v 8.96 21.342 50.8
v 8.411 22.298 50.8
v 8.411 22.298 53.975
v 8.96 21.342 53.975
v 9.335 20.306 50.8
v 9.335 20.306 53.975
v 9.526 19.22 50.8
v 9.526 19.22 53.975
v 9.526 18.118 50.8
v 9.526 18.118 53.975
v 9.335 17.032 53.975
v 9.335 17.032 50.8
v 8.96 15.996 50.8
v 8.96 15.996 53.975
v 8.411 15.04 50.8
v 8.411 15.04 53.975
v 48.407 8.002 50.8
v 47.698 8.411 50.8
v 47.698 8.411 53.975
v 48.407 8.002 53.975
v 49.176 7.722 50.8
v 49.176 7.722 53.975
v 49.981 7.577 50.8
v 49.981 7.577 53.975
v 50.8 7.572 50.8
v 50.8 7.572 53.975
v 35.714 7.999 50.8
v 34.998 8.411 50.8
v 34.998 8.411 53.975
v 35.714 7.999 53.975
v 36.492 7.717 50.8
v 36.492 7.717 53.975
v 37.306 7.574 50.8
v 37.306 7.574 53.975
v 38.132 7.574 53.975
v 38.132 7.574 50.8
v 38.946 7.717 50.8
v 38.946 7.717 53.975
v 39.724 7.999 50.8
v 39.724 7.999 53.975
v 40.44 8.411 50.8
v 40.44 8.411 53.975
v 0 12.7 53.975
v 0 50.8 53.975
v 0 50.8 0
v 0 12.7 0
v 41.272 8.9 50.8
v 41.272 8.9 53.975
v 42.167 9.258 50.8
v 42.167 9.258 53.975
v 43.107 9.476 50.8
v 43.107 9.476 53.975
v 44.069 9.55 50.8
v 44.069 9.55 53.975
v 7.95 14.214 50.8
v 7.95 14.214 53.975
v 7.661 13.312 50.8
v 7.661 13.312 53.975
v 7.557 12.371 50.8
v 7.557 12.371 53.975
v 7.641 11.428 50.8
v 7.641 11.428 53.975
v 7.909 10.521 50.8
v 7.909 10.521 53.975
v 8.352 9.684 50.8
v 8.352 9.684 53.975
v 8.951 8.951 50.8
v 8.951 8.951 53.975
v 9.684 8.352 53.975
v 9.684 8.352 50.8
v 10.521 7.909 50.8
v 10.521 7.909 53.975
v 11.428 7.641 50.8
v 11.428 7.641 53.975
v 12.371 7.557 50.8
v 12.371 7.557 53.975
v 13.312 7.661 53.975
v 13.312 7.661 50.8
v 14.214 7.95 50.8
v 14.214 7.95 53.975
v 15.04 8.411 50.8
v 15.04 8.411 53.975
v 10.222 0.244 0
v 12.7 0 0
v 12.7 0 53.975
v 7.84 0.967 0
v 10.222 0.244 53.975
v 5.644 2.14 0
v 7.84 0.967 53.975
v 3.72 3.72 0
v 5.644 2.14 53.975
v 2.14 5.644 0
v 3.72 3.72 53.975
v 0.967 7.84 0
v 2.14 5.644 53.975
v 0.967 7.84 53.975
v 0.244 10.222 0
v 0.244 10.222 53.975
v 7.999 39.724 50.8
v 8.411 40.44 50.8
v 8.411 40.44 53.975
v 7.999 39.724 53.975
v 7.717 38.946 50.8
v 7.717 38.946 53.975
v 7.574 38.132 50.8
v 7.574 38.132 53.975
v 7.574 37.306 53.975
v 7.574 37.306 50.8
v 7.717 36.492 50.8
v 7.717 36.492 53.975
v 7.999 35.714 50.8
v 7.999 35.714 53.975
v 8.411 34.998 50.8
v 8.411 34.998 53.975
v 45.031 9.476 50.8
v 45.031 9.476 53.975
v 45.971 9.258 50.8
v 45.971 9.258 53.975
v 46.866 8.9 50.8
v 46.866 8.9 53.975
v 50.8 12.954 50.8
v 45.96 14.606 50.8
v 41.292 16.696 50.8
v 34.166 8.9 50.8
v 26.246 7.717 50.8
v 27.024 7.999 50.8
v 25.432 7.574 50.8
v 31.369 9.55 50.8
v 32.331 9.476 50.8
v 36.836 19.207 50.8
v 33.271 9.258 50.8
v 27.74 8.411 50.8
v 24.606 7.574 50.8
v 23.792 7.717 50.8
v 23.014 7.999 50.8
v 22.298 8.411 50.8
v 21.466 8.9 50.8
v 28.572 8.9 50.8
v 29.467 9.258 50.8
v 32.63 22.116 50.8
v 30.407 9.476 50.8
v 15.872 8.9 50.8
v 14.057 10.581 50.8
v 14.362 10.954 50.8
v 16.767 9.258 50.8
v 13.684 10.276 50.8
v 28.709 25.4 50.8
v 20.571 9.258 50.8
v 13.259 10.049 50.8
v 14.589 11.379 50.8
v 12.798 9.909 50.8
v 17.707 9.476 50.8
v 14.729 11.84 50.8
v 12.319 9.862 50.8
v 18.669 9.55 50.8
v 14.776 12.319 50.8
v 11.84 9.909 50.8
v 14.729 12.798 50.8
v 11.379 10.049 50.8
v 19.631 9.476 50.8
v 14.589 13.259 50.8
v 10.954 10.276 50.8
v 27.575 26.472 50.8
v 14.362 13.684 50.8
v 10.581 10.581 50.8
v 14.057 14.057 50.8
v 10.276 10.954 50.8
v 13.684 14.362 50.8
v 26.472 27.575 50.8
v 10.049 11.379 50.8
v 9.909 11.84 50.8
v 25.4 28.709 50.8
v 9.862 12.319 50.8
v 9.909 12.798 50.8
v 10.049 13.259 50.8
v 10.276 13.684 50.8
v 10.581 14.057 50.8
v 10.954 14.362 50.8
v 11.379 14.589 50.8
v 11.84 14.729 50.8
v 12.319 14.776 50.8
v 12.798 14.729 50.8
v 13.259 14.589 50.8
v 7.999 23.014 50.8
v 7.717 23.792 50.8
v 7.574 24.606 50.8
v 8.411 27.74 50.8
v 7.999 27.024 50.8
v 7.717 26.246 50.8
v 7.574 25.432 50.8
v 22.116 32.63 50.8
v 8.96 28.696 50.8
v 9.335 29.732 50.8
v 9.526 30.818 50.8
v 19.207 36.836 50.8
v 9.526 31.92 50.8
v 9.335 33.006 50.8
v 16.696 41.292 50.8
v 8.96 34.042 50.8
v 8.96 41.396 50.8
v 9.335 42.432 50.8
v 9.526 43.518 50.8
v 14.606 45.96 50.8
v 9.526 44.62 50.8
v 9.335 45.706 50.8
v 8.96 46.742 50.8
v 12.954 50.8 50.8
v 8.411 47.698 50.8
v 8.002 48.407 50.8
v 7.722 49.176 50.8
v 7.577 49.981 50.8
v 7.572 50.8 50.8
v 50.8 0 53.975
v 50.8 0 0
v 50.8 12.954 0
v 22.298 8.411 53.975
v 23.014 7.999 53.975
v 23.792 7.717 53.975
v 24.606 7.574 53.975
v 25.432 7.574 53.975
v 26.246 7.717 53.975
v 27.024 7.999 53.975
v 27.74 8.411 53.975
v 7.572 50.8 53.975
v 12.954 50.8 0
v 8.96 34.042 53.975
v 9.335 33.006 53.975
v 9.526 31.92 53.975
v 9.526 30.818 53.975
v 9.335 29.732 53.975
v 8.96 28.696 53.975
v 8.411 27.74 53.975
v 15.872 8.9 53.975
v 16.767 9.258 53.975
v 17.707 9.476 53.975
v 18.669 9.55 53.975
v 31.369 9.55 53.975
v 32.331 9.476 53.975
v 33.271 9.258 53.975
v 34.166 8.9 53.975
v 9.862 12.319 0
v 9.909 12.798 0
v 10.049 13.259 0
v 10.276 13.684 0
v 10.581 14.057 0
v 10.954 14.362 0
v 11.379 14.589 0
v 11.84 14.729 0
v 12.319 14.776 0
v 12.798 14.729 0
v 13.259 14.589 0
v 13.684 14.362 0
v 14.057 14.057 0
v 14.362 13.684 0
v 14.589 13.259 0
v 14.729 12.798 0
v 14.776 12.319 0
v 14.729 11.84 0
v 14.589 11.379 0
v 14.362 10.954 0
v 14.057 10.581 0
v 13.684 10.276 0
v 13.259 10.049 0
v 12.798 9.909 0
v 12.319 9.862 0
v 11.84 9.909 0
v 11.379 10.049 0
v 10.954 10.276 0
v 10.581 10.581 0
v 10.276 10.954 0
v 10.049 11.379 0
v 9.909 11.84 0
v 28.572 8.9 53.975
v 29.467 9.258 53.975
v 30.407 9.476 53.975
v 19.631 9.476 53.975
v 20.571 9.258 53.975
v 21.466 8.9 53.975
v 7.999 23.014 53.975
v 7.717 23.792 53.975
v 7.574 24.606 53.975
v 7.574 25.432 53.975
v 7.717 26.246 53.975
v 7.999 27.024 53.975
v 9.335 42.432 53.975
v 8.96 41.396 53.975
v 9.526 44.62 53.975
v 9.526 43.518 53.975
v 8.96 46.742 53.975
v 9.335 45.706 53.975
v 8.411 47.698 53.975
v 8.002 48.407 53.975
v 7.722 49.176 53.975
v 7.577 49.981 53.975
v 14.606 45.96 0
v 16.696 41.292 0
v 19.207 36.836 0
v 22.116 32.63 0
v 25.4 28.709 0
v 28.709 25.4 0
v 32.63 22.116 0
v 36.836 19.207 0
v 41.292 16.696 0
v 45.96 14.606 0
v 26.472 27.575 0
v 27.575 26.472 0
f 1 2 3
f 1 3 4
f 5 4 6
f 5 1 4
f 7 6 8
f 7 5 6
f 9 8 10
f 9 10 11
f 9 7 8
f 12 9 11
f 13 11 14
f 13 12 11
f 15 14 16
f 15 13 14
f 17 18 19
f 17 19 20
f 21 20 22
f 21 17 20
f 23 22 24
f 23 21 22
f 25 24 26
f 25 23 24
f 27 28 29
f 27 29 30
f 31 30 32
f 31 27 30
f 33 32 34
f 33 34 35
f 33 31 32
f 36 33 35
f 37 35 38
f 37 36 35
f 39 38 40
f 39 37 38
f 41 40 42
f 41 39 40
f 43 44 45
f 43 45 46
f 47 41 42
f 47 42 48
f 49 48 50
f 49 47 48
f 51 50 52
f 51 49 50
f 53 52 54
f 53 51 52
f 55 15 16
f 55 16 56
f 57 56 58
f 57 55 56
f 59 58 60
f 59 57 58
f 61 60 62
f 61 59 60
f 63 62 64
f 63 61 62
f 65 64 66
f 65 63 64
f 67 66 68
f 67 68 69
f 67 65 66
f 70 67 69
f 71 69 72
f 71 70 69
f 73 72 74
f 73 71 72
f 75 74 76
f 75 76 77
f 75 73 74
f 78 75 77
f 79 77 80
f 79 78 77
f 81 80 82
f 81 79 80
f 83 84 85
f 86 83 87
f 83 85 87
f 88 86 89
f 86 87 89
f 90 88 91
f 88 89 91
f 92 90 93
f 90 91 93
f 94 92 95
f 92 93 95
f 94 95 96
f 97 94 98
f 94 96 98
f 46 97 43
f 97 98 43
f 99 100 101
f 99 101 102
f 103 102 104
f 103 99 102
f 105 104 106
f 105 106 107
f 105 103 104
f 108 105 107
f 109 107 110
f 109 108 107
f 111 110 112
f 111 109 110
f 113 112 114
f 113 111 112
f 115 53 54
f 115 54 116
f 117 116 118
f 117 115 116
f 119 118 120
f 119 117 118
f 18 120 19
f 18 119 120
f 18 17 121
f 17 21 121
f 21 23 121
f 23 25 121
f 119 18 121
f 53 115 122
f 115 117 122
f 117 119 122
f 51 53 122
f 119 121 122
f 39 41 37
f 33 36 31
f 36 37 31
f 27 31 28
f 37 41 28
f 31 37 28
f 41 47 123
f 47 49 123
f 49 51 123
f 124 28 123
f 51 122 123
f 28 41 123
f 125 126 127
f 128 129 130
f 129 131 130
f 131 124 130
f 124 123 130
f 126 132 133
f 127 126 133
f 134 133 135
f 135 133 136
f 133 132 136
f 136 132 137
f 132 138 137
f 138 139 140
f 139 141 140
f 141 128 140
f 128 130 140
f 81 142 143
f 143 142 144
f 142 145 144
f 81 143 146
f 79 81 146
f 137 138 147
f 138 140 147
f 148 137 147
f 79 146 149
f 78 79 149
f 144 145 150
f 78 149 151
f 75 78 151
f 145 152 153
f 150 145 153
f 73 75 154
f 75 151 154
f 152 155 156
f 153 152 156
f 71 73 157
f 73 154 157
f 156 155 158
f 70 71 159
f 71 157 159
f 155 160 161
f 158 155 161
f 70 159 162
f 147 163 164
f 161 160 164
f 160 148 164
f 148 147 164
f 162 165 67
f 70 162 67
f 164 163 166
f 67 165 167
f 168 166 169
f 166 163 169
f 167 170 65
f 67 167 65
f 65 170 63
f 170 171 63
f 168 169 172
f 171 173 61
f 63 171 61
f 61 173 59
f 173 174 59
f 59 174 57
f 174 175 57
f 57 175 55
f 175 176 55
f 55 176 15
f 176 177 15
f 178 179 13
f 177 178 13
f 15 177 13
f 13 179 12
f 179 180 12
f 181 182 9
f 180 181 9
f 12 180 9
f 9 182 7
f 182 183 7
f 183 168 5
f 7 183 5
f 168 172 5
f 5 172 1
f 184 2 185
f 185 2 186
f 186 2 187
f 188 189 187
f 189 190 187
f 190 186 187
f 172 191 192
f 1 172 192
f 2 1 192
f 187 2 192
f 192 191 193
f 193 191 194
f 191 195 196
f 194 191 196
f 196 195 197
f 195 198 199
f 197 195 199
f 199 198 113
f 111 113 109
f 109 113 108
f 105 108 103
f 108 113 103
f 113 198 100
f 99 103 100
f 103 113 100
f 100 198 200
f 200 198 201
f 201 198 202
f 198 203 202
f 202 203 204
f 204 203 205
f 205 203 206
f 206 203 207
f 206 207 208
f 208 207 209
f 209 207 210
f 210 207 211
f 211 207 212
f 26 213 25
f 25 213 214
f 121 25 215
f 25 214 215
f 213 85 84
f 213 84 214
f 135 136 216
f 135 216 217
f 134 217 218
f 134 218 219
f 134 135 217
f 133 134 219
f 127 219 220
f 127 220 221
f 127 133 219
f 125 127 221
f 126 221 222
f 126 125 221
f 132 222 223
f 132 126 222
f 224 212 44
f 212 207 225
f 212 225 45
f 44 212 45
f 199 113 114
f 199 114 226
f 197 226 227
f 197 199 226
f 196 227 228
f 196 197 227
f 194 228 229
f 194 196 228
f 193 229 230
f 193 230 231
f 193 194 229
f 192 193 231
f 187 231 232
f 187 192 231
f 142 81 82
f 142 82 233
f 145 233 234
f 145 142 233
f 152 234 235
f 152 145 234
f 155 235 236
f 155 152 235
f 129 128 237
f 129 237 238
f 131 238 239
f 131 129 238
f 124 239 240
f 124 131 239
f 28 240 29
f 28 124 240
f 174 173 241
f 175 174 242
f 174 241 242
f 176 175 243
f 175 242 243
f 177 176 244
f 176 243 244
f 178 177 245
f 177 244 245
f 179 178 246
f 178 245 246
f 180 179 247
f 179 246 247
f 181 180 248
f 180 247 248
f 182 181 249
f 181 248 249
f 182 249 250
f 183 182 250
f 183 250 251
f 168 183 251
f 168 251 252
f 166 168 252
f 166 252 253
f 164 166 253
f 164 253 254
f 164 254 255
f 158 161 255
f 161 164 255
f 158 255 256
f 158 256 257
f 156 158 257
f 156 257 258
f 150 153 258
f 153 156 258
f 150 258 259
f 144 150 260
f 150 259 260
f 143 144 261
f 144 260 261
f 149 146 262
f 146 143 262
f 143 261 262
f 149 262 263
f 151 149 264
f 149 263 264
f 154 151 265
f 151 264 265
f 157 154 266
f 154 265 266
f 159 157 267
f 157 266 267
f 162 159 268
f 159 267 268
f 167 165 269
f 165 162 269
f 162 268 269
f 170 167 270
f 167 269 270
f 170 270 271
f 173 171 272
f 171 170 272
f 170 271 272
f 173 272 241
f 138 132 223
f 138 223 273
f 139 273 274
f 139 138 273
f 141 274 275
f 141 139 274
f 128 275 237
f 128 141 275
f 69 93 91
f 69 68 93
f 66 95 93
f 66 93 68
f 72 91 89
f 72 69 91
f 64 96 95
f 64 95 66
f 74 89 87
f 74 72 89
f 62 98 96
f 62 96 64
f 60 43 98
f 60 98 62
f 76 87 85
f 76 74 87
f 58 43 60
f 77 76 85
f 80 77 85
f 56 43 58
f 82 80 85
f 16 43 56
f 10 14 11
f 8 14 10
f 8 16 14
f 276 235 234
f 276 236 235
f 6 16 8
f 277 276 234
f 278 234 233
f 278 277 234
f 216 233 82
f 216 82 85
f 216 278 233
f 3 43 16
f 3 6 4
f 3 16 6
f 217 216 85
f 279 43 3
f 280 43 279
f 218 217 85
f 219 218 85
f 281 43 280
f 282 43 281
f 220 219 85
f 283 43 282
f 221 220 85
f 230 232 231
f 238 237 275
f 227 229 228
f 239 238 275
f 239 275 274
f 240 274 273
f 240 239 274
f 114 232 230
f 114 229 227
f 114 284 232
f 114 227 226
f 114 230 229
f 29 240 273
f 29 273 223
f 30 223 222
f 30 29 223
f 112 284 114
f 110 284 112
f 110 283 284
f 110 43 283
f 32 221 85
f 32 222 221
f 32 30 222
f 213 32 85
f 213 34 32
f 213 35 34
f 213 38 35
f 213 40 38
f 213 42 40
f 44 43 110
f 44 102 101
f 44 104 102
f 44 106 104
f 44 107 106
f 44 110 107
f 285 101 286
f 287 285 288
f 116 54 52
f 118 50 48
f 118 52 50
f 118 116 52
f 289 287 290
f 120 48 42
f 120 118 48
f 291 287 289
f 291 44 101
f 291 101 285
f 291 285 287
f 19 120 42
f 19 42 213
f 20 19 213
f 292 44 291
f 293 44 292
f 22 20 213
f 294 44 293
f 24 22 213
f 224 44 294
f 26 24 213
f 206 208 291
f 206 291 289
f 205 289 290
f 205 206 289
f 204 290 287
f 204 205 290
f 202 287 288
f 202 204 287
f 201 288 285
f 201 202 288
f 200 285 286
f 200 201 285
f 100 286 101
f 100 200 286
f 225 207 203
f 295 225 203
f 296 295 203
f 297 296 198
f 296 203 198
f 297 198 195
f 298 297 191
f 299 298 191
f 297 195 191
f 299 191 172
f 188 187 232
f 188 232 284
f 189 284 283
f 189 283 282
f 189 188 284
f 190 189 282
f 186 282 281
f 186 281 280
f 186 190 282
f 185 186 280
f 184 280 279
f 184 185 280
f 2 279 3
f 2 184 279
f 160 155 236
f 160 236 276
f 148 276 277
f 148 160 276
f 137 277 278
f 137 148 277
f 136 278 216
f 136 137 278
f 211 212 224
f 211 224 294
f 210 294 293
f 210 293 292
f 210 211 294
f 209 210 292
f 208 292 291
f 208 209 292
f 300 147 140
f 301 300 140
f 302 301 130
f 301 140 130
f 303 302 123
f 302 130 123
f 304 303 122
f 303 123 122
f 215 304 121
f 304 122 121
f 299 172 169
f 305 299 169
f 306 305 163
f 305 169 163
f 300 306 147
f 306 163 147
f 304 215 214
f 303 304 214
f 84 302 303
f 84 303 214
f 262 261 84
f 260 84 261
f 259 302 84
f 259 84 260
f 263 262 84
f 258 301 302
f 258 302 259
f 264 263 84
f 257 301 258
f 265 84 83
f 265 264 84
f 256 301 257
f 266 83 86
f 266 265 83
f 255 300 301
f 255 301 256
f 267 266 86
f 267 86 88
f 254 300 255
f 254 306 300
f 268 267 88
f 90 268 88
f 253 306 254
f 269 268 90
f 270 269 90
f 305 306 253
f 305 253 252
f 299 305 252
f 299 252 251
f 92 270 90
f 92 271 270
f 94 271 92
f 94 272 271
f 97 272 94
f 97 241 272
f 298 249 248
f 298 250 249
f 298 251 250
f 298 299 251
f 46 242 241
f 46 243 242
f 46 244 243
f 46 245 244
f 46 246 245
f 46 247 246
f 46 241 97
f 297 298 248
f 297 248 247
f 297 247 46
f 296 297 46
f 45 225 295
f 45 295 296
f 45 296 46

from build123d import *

# Parameters (mm, degrees)
BOSS_EXTRUDE1_DEPTH          = 53.975
F_10_0_1935_DIAMETER_HOLE1_D = 4.9149
CUT_EXTRUDE2_DEPTH           = 90.858670283
CUT_EXTRUDE3_START           = -3.175
SKETCH4_4_R                  = 2.45745
CUT_EXTRUDE3_DEPTH           = 3.175
CUT_EXTRUDE5_DEPTH           = 88.988181024
EXTRUDE_THIN1_DEPTH          = 50.8


with BuildPart() as part:
    # Sketch1 → Boss-Extrude1 (new body)
    with BuildSketch(Plane.XY):
        Polygon((0, 0), (50.8, 0), (50.8, 25.4), (25.4, 25.4), (25.4, 50.8), (0, 50.8), align=None)
    extrude(amount=BOSS_EXTRUDE1_DEPTH)

    # #10 (0.1935) Diameter Hole1 (through all)
    with Locations(Plane(origin=(12.319, 12.319, 53.975), x_dir=(1, 0, 0), z_dir=(0, 0, 1))):
        with Locations((0, 0)):
            Hole(F_10_0_1935_DIAMETER_HOLE1_D / 2)

    # Sketch4 → Cut-Extrude2 (cut, through all)
    with BuildSketch(Plane.XY.offset(53.975)):
        with BuildLine():
            ThreePointArc((12.7, 0), (3.719743879, 3.719743879), (0, 12.7))
            Line((0, 12.7), (0, 0))
            Line((0, 0), (12.7, 0))
        make_face()
    extrude(amount=-CUT_EXTRUDE2_DEPTH, mode=Mode.SUBTRACT)

    # Sketch4<4> → Cut-Extrude3 (cut)
    with BuildSketch(Plane.XY.offset(53.975).offset(CUT_EXTRUDE3_START)):
        with BuildLine():
            Line((25.4, 50.8), (7.571764462, 50.8))
            ThreePointArc((7.571764462, 50.8), (7.721601354, 49.175886193), (8.410645771, 47.697571429))
            ThreePointArc((8.410645771, 47.697571429), (9.549506799, 44.069), (8.410645771, 40.440428571))
            ThreePointArc((8.410645771, 40.440428571), (7.5565, 37.719), (8.410645771, 34.997571429))
            ThreePointArc((8.410645771, 34.997571429), (9.549506799, 31.369), (8.410645771, 27.740428571))
            ThreePointArc((8.410645771, 27.740428571), (7.5565, 25.019), (8.410645771, 22.297571429))
            ThreePointArc((8.410645771, 22.297571429), (9.549506799, 18.669), (8.410645771, 15.040428571))
            ThreePointArc((8.410645771, 15.040428571), (8.951403955, 8.951403955), (15.040428571, 8.410645771))
            ThreePointArc((15.040428571, 8.410645771), (16.767452272, 9.258105336), (18.669, 9.549506799))
            ThreePointArc((18.669, 9.549506799), (20.570547728, 9.258105336), (22.297571429, 8.410645771))
            ThreePointArc((22.297571429, 8.410645771), (25.019, 7.5565), (27.740428571, 8.410645771))
            ThreePointArc((27.740428571, 8.410645771), (29.467452272, 9.258105336), (31.369, 9.549506799))
            ThreePointArc((31.369, 9.549506799), (33.270547728, 9.258105336), (34.997571429, 8.410645771))
            ThreePointArc((34.997571429, 8.410645771), (37.719, 7.5565), (40.440428571, 8.410645771))
            ThreePointArc((40.440428571, 8.410645771), (42.167452272, 9.258105336), (44.069, 9.549506799))
            ThreePointArc((44.069, 9.549506799), (45.970547728, 9.258105336), (47.697571429, 8.410645771))
            ThreePointArc((47.697571429, 8.410645771), (49.175886193, 7.721601354), (50.8, 7.571764462))
            Line((50.8, 7.571764462), (50.8, 25.4))
            Line((50.8, 25.4), (25.4, 25.4))
            Line((25.4, 25.4), (25.4, 50.8))
        make_face()
        with Locations((12.319, 12.319)):
            Circle(SKETCH4_4_R, mode=Mode.SUBTRACT)
    extrude(amount=CUT_EXTRUDE3_DEPTH, mode=Mode.SUBTRACT)

    # Sketch7 → Cut-Extrude5 (cut, through all)
    with BuildSketch(Plane.XY.offset(50.8)):
        with BuildLine():
            Line((25.4, 50.8), (12.954, 50.8))
            ThreePointArc((12.954, 50.8), (17.900023052, 39.035105247), (25.4, 28.709107069))
            Line((25.4, 28.709107069), (25.4, 50.8))
        make_face()
        with BuildLine():
            Line((50.8, 25.4), (28.709107069, 25.4))
            ThreePointArc((28.709107069, 25.4), (39.035105247, 17.900023052), (50.8, 12.954))
            Line((50.8, 12.954), (50.8, 25.4))
        make_face()
    extrude(amount=-CUT_EXTRUDE5_DEPTH, mode=Mode.SUBTRACT)

    # Sketch8 → Extrude-Thin1 (add)
    with BuildSketch(Plane.XY.offset(50.8)):
        with BuildLine():
            ThreePointArc((25.4, 28.709107069), (27.019699139, 27.019699139), (28.709107069, 25.4))
            Line((28.709107069, 25.4), (26.990285921, 23.529905387))
            ThreePointArc((26.990285921, 23.529905387), (25.223647915, 25.223647915), (23.529905387, 26.990285921))
            Line((23.529905387, 26.990285921), (25.4, 28.709107069))
        make_face()
    extrude(amount=-EXTRUDE_THIN1_DEPTH)


solid = part.part
